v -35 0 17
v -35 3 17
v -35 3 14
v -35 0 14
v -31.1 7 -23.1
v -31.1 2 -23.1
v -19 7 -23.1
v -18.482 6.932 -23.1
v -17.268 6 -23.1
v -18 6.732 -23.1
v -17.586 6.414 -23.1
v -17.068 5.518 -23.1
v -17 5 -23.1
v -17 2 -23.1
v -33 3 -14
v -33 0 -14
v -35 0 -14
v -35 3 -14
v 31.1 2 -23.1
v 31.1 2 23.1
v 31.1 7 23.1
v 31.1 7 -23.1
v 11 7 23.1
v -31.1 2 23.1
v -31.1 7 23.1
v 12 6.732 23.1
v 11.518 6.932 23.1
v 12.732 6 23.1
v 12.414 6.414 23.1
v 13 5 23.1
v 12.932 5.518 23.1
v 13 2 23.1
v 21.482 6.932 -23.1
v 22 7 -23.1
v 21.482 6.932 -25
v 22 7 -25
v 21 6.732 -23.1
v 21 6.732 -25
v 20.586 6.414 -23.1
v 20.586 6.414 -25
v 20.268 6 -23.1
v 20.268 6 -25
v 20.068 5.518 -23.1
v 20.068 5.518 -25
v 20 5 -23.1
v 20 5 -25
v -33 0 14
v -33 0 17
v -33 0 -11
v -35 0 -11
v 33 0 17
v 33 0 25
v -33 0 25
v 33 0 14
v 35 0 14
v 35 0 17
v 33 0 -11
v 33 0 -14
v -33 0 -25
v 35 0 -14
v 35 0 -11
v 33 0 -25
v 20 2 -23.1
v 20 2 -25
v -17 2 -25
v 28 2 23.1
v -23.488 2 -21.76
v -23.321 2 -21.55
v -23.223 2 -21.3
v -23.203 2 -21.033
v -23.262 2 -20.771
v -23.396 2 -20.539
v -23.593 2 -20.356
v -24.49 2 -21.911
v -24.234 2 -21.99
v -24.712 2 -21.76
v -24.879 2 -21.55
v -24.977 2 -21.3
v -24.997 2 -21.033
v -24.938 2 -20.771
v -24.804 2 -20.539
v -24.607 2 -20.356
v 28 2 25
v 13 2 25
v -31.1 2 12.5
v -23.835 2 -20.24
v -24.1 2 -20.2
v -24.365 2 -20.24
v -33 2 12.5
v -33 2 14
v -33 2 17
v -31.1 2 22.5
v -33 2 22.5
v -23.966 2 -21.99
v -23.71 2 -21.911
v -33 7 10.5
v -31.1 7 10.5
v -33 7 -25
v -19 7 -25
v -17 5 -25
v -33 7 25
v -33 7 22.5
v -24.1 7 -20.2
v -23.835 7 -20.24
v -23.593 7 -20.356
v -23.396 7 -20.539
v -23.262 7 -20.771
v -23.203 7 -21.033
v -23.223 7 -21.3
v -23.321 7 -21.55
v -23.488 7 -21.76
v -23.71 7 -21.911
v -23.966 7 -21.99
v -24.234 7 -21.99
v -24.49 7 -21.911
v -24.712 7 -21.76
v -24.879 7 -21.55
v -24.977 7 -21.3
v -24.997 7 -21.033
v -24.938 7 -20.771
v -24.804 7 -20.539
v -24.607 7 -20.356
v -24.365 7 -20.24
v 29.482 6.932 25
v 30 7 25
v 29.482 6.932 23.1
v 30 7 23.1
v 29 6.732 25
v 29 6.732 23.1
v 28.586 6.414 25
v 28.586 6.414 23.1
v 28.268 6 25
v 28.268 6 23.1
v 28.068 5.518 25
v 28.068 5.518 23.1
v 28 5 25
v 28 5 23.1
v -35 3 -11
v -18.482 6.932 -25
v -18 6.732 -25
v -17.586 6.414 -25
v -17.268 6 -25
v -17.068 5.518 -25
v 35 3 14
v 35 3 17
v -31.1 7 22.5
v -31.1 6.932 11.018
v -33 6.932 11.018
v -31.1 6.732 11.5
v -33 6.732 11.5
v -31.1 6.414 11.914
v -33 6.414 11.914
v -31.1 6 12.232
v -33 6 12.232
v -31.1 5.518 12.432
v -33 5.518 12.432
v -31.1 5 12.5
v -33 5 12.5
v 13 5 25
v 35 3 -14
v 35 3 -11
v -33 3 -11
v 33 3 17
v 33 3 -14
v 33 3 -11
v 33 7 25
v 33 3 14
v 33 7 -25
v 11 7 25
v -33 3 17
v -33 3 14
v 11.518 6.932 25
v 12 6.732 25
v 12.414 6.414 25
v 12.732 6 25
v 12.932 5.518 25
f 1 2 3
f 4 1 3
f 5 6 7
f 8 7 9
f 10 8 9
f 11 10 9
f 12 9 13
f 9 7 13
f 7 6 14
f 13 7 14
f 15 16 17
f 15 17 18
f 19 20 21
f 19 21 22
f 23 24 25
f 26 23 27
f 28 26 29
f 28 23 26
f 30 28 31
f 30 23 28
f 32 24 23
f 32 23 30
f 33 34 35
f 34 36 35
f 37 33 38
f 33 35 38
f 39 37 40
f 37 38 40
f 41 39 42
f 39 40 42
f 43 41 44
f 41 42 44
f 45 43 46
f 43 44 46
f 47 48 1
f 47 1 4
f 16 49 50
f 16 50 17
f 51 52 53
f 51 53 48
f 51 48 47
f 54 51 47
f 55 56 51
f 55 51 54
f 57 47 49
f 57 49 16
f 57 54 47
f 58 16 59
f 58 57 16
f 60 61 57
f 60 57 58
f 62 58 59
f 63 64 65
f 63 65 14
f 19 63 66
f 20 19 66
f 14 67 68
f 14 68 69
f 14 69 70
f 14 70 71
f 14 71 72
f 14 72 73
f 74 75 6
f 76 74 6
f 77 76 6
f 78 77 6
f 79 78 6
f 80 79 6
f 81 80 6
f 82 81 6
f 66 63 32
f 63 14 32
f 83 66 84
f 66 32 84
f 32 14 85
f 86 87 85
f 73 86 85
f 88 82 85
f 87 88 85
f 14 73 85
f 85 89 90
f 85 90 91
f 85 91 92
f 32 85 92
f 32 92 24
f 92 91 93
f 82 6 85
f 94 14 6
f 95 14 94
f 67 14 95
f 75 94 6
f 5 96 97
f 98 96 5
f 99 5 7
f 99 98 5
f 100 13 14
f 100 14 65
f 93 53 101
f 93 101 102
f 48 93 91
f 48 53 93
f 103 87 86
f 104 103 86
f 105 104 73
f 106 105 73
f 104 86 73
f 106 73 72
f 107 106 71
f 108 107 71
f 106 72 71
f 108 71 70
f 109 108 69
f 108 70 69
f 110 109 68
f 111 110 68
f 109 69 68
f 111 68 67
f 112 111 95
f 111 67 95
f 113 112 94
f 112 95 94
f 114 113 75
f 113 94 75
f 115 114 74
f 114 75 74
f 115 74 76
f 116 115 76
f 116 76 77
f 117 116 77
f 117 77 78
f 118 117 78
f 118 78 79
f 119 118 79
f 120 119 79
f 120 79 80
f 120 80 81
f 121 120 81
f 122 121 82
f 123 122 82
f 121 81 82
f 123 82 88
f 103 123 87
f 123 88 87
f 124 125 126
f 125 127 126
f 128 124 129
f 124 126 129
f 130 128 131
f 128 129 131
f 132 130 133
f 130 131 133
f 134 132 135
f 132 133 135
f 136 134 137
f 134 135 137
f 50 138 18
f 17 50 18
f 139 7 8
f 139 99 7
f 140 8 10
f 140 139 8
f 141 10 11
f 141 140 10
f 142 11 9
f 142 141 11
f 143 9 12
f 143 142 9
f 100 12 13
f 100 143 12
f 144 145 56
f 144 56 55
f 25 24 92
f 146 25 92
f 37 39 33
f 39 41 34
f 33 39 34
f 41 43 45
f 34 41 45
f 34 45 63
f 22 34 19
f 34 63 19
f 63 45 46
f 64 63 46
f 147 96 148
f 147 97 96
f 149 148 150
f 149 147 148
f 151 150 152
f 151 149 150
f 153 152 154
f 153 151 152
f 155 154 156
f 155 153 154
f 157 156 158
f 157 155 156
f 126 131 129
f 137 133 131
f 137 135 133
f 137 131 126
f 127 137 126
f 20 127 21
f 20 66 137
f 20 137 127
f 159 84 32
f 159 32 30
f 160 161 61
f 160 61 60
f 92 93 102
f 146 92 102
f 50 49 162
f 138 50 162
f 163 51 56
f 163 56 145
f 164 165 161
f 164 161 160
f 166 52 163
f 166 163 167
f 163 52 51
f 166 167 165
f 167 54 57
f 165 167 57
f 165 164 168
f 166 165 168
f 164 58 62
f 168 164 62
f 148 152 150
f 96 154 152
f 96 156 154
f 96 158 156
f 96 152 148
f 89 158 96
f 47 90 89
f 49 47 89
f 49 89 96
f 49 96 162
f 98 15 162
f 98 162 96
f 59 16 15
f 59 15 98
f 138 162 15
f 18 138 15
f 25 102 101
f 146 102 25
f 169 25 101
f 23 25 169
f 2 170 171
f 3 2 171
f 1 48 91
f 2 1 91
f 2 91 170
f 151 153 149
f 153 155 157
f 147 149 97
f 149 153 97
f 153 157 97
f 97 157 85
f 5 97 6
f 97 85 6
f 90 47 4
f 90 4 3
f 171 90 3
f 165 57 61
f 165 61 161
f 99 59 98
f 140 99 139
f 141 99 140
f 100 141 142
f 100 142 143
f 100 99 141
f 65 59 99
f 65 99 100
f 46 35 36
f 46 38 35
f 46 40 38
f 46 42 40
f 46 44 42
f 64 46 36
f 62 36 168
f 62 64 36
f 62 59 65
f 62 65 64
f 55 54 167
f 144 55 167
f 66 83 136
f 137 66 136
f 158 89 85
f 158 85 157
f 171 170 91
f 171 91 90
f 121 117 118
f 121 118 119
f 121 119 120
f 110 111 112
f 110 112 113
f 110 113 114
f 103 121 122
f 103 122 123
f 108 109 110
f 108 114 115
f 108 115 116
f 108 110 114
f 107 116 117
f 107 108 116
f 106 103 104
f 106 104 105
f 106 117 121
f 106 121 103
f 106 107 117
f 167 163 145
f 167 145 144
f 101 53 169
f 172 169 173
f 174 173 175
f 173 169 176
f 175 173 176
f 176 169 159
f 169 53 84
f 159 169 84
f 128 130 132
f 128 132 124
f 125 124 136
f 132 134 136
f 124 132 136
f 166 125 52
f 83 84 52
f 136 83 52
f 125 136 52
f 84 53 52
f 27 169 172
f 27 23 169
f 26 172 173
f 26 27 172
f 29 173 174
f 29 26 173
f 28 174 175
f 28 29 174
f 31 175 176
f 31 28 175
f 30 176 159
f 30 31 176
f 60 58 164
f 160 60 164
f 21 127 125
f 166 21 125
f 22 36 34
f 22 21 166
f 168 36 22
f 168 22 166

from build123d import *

# Parameters (mm, degrees)
SKETCH_2_W          = 66
SKETCH_2_H          = 50
EXTRUDE_1_DEPTH     = 2
SKETCH_3_W          = 66
SKETCH_3_H          = 50
SKETCH_3_W_2        = 62.2
SKETCH_3_H_2        = 46.2
EXTRUDE_2_DEPTH     = 5
SKETCH_4_W          = 37
SKETCH_4_H          = 6.241197807
CUT_EXTRUDE_1_DEPTH = 5
SKETCH_5_R          = 0.9
EXTRUDE_3_DEPTH     = 5
SKETCH_6_W          = 10
SKETCH_6_H          = 5
CUT_EXTRUDE_2_DEPTH = 5
SKETCH_7_W          = 15
SKETCH_7_H          = 5
CUT_EXTRUDE_3_DEPTH = 5
FILLET_1_R          = 2
SKETCH_8_W          = 3
SKETCH_8_H          = 3
EXTRUDE_4_DEPTH     = 2


with BuildPart() as part:
    # 草图2 → 凸台-拉伸1 (new body)
    with BuildSketch(Plane(origin=(0, 0, 0), x_dir=(1, 0, 0), z_dir=(0, 1, 0))):
        Rectangle(SKETCH_2_W, SKETCH_2_H)
    extrude(amount=EXTRUDE_1_DEPTH)

    # 草图3 → 凸台-拉伸2 (add)
    with BuildSketch(Plane(origin=(0, 2, 0), x_dir=(1, 0, 0), z_dir=(0, 1, 0))):
        Rectangle(SKETCH_3_W, SKETCH_3_H)
        Rectangle(SKETCH_3_W_2, SKETCH_3_H_2, mode=Mode.SUBTRACT)
    extrude(amount=EXTRUDE_2_DEPTH)

    # 草图4 → 切除-拉伸1 (cut)
    with BuildSketch(Plane(origin=(0, 7, 0), x_dir=(1, 0, 0), z_dir=(0, 1, 0))):
        with Locations((1.5, 25.15912339)):
            Rectangle(SKETCH_4_W, SKETCH_4_H)
    extrude(amount=-CUT_EXTRUDE_1_DEPTH, mode=Mode.SUBTRACT)

    # 草图5 → 凸台-拉伸3 (add)
    with BuildSketch(Plane(origin=(0, 2, 0), x_dir=(1, 0, 0), z_dir=(0, 1, 0))):
        with Locations(Location((-24.1, 21.1, 0), (0, 0, 270))):
            Circle(SKETCH_5_R)
    extrude(amount=EXTRUDE_3_DEPTH)

    # 草图6 → 切除-拉伸2 (cut)
    with BuildSketch(Plane.ZY.offset(33)):
        with Locations((17.5, 4.5)):
            Rectangle(SKETCH_6_W, SKETCH_6_H)
    extrude(amount=-CUT_EXTRUDE_2_DEPTH, mode=Mode.SUBTRACT)

    # 草图7 → 切除-拉伸3 (cut)
    with BuildSketch(Plane.XY.offset(25)):
        with Locations((20.5, 4.5)):
            Rectangle(SKETCH_7_W, SKETCH_7_H)
    extrude(amount=-CUT_EXTRUDE_3_DEPTH, mode=Mode.SUBTRACT)

    # 圆角1
    fillet_1_edges = [part.edges().sort_by_distance(p)[0] for p in [
        (13, 7, 24.05),
        (28, 7, 24.05),
        (-17, 7, -24.05),
        (20, 7, -24.05),
        (-32.05, 7, 12.5),
    ]]
    fillet(fillet_1_edges, radius=FILLET_1_R)

    # 草图8 → 凸台-拉伸4 (add)
    with BuildSketch(Plane(origin=(33, 0, 0), x_dir=(0, 0, -1), z_dir=(1, 0, 0))):
        with Locations((-15.5, 1.5)):
            Rectangle(SKETCH_8_W, SKETCH_8_H)
        with Locations((12.5, 1.5)):
            Rectangle(SKETCH_8_W, SKETCH_8_H)
    extrude_4 = extrude(amount=EXTRUDE_4_DEPTH)

    # 镜向1: 凸台-拉伸4 across plane
    add(extrude_4.mirror(Plane(origin=(0, 0, 0), x_dir=(0, 0, 1), z_dir=(1, 0, 0))))


solid = part.part
